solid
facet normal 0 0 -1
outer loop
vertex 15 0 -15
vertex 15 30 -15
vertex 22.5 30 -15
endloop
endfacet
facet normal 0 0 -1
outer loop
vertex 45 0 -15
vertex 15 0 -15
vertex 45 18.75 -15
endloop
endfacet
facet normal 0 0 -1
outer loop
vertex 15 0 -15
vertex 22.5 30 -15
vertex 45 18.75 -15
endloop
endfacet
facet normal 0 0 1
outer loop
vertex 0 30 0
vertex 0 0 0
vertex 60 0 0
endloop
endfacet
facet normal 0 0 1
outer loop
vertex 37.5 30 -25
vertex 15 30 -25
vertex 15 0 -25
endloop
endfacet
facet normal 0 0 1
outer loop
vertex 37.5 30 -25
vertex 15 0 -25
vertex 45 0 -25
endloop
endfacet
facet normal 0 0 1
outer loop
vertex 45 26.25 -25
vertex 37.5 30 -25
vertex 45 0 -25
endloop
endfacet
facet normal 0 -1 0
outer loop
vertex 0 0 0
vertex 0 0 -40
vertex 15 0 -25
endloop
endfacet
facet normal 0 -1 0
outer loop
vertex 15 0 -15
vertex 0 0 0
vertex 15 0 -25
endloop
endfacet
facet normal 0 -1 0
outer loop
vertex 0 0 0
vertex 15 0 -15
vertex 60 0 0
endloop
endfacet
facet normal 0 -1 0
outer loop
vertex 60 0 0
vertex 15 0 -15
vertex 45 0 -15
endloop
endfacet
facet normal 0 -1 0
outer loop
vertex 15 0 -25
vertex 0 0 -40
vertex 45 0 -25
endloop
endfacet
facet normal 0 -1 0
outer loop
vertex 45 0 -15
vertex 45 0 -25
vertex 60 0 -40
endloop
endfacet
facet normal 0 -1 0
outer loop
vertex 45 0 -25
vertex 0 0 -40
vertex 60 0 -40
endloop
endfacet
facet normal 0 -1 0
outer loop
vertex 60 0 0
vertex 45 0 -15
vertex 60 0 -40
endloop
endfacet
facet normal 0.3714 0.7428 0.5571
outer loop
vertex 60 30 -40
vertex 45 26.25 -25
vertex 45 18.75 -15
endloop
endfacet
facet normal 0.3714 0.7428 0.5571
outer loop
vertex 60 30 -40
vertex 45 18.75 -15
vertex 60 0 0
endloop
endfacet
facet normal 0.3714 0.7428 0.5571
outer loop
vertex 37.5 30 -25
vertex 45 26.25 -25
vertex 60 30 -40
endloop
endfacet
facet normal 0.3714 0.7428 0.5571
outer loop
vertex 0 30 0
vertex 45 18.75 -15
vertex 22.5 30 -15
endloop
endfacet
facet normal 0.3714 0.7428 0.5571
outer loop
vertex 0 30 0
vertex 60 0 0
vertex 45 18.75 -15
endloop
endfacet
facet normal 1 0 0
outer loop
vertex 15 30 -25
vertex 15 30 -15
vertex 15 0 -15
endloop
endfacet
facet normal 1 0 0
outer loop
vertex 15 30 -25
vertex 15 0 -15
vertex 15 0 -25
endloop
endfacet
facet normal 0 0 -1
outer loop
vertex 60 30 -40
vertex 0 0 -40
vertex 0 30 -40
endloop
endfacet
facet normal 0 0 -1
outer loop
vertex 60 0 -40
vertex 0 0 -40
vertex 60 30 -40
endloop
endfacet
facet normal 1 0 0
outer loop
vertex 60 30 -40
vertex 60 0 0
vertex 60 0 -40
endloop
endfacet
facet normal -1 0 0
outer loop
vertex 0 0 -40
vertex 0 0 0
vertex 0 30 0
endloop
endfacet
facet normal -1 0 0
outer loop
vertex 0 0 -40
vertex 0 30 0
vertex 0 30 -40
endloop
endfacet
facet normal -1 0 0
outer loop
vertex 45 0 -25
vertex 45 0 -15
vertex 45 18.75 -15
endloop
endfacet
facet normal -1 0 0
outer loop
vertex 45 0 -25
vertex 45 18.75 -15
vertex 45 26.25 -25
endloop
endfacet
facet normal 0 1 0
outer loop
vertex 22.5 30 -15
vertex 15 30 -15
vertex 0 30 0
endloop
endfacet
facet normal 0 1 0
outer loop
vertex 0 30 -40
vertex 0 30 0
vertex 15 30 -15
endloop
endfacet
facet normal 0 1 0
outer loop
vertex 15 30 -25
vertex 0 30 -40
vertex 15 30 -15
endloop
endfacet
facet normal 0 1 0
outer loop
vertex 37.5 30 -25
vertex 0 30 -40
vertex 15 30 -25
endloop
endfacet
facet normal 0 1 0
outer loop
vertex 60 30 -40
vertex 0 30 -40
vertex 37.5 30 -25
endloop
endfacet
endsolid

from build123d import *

# Parameters (mm, degrees)
SKETCH1_W           = 60
SKETCH1_H           = 40
BOSS_EXTRUDE1_DEPTH = 30
CUT_LOFT2_START     = -14
CUT_LOFT2_DEPTH     = 69
SKETCH9_W           = 30
SKETCH9_H           = 10
CUT_EXTRUDE4_DEPTH  = 50


with BuildPart() as part:
    # Sketch1 → Boss-Extrude1 (new body)
    with BuildSketch(Plane(origin=(0, 0, 0), x_dir=(1, 0, 0), z_dir=(0, 1, 0))):
        with Locations((30, 20)):
            Rectangle(SKETCH1_W, SKETCH1_H)
    extrude(amount=BOSS_EXTRUDE1_DEPTH)

    # Cut-Loft2: read off the stored shape, not the designer's step
    # Cut-Loft2 outline → Cut-Loft2 (cut)
    with BuildSketch(Plane(origin=(0, 0, 0), x_dir=(0.4472135954999584, 0.8944271909999156, 0), z_dir=(0.8944271909999156, -0.4472135954999584, 0)).offset(CUT_LOFT2_START)):
        Polygon((55, 0), (26.83281573, 0), (53.66563146, -40), (54.336451853, -41), (55, -41), align=None)
    extrude(amount=CUT_LOFT2_DEPTH, mode=Mode.SUBTRACT)

    # Sketch9 → Cut-Extrude4 (cut)
    with BuildSketch(Plane(origin=(0, 30, 0), x_dir=(1, 0, 0), z_dir=(0, 1, 0))):
        with Locations((30, 20)):
            Rectangle(SKETCH9_W, SKETCH9_H)
    extrude(amount=-CUT_EXTRUDE4_DEPTH, mode=Mode.SUBTRACT)


solid = part.part
